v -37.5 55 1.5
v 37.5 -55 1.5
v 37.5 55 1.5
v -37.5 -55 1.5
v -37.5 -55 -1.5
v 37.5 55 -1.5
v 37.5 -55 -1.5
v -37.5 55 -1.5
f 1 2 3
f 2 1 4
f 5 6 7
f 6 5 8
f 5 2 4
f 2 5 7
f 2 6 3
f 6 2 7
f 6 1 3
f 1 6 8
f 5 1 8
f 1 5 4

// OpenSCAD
// ========================================
// a 75 x 110 x 3 mm plate
// NeuroCAD canonical IR; dimensions are millimetres
// ========================================
$fn = 48;

cube(size=[75, 110, 3], center=true);
